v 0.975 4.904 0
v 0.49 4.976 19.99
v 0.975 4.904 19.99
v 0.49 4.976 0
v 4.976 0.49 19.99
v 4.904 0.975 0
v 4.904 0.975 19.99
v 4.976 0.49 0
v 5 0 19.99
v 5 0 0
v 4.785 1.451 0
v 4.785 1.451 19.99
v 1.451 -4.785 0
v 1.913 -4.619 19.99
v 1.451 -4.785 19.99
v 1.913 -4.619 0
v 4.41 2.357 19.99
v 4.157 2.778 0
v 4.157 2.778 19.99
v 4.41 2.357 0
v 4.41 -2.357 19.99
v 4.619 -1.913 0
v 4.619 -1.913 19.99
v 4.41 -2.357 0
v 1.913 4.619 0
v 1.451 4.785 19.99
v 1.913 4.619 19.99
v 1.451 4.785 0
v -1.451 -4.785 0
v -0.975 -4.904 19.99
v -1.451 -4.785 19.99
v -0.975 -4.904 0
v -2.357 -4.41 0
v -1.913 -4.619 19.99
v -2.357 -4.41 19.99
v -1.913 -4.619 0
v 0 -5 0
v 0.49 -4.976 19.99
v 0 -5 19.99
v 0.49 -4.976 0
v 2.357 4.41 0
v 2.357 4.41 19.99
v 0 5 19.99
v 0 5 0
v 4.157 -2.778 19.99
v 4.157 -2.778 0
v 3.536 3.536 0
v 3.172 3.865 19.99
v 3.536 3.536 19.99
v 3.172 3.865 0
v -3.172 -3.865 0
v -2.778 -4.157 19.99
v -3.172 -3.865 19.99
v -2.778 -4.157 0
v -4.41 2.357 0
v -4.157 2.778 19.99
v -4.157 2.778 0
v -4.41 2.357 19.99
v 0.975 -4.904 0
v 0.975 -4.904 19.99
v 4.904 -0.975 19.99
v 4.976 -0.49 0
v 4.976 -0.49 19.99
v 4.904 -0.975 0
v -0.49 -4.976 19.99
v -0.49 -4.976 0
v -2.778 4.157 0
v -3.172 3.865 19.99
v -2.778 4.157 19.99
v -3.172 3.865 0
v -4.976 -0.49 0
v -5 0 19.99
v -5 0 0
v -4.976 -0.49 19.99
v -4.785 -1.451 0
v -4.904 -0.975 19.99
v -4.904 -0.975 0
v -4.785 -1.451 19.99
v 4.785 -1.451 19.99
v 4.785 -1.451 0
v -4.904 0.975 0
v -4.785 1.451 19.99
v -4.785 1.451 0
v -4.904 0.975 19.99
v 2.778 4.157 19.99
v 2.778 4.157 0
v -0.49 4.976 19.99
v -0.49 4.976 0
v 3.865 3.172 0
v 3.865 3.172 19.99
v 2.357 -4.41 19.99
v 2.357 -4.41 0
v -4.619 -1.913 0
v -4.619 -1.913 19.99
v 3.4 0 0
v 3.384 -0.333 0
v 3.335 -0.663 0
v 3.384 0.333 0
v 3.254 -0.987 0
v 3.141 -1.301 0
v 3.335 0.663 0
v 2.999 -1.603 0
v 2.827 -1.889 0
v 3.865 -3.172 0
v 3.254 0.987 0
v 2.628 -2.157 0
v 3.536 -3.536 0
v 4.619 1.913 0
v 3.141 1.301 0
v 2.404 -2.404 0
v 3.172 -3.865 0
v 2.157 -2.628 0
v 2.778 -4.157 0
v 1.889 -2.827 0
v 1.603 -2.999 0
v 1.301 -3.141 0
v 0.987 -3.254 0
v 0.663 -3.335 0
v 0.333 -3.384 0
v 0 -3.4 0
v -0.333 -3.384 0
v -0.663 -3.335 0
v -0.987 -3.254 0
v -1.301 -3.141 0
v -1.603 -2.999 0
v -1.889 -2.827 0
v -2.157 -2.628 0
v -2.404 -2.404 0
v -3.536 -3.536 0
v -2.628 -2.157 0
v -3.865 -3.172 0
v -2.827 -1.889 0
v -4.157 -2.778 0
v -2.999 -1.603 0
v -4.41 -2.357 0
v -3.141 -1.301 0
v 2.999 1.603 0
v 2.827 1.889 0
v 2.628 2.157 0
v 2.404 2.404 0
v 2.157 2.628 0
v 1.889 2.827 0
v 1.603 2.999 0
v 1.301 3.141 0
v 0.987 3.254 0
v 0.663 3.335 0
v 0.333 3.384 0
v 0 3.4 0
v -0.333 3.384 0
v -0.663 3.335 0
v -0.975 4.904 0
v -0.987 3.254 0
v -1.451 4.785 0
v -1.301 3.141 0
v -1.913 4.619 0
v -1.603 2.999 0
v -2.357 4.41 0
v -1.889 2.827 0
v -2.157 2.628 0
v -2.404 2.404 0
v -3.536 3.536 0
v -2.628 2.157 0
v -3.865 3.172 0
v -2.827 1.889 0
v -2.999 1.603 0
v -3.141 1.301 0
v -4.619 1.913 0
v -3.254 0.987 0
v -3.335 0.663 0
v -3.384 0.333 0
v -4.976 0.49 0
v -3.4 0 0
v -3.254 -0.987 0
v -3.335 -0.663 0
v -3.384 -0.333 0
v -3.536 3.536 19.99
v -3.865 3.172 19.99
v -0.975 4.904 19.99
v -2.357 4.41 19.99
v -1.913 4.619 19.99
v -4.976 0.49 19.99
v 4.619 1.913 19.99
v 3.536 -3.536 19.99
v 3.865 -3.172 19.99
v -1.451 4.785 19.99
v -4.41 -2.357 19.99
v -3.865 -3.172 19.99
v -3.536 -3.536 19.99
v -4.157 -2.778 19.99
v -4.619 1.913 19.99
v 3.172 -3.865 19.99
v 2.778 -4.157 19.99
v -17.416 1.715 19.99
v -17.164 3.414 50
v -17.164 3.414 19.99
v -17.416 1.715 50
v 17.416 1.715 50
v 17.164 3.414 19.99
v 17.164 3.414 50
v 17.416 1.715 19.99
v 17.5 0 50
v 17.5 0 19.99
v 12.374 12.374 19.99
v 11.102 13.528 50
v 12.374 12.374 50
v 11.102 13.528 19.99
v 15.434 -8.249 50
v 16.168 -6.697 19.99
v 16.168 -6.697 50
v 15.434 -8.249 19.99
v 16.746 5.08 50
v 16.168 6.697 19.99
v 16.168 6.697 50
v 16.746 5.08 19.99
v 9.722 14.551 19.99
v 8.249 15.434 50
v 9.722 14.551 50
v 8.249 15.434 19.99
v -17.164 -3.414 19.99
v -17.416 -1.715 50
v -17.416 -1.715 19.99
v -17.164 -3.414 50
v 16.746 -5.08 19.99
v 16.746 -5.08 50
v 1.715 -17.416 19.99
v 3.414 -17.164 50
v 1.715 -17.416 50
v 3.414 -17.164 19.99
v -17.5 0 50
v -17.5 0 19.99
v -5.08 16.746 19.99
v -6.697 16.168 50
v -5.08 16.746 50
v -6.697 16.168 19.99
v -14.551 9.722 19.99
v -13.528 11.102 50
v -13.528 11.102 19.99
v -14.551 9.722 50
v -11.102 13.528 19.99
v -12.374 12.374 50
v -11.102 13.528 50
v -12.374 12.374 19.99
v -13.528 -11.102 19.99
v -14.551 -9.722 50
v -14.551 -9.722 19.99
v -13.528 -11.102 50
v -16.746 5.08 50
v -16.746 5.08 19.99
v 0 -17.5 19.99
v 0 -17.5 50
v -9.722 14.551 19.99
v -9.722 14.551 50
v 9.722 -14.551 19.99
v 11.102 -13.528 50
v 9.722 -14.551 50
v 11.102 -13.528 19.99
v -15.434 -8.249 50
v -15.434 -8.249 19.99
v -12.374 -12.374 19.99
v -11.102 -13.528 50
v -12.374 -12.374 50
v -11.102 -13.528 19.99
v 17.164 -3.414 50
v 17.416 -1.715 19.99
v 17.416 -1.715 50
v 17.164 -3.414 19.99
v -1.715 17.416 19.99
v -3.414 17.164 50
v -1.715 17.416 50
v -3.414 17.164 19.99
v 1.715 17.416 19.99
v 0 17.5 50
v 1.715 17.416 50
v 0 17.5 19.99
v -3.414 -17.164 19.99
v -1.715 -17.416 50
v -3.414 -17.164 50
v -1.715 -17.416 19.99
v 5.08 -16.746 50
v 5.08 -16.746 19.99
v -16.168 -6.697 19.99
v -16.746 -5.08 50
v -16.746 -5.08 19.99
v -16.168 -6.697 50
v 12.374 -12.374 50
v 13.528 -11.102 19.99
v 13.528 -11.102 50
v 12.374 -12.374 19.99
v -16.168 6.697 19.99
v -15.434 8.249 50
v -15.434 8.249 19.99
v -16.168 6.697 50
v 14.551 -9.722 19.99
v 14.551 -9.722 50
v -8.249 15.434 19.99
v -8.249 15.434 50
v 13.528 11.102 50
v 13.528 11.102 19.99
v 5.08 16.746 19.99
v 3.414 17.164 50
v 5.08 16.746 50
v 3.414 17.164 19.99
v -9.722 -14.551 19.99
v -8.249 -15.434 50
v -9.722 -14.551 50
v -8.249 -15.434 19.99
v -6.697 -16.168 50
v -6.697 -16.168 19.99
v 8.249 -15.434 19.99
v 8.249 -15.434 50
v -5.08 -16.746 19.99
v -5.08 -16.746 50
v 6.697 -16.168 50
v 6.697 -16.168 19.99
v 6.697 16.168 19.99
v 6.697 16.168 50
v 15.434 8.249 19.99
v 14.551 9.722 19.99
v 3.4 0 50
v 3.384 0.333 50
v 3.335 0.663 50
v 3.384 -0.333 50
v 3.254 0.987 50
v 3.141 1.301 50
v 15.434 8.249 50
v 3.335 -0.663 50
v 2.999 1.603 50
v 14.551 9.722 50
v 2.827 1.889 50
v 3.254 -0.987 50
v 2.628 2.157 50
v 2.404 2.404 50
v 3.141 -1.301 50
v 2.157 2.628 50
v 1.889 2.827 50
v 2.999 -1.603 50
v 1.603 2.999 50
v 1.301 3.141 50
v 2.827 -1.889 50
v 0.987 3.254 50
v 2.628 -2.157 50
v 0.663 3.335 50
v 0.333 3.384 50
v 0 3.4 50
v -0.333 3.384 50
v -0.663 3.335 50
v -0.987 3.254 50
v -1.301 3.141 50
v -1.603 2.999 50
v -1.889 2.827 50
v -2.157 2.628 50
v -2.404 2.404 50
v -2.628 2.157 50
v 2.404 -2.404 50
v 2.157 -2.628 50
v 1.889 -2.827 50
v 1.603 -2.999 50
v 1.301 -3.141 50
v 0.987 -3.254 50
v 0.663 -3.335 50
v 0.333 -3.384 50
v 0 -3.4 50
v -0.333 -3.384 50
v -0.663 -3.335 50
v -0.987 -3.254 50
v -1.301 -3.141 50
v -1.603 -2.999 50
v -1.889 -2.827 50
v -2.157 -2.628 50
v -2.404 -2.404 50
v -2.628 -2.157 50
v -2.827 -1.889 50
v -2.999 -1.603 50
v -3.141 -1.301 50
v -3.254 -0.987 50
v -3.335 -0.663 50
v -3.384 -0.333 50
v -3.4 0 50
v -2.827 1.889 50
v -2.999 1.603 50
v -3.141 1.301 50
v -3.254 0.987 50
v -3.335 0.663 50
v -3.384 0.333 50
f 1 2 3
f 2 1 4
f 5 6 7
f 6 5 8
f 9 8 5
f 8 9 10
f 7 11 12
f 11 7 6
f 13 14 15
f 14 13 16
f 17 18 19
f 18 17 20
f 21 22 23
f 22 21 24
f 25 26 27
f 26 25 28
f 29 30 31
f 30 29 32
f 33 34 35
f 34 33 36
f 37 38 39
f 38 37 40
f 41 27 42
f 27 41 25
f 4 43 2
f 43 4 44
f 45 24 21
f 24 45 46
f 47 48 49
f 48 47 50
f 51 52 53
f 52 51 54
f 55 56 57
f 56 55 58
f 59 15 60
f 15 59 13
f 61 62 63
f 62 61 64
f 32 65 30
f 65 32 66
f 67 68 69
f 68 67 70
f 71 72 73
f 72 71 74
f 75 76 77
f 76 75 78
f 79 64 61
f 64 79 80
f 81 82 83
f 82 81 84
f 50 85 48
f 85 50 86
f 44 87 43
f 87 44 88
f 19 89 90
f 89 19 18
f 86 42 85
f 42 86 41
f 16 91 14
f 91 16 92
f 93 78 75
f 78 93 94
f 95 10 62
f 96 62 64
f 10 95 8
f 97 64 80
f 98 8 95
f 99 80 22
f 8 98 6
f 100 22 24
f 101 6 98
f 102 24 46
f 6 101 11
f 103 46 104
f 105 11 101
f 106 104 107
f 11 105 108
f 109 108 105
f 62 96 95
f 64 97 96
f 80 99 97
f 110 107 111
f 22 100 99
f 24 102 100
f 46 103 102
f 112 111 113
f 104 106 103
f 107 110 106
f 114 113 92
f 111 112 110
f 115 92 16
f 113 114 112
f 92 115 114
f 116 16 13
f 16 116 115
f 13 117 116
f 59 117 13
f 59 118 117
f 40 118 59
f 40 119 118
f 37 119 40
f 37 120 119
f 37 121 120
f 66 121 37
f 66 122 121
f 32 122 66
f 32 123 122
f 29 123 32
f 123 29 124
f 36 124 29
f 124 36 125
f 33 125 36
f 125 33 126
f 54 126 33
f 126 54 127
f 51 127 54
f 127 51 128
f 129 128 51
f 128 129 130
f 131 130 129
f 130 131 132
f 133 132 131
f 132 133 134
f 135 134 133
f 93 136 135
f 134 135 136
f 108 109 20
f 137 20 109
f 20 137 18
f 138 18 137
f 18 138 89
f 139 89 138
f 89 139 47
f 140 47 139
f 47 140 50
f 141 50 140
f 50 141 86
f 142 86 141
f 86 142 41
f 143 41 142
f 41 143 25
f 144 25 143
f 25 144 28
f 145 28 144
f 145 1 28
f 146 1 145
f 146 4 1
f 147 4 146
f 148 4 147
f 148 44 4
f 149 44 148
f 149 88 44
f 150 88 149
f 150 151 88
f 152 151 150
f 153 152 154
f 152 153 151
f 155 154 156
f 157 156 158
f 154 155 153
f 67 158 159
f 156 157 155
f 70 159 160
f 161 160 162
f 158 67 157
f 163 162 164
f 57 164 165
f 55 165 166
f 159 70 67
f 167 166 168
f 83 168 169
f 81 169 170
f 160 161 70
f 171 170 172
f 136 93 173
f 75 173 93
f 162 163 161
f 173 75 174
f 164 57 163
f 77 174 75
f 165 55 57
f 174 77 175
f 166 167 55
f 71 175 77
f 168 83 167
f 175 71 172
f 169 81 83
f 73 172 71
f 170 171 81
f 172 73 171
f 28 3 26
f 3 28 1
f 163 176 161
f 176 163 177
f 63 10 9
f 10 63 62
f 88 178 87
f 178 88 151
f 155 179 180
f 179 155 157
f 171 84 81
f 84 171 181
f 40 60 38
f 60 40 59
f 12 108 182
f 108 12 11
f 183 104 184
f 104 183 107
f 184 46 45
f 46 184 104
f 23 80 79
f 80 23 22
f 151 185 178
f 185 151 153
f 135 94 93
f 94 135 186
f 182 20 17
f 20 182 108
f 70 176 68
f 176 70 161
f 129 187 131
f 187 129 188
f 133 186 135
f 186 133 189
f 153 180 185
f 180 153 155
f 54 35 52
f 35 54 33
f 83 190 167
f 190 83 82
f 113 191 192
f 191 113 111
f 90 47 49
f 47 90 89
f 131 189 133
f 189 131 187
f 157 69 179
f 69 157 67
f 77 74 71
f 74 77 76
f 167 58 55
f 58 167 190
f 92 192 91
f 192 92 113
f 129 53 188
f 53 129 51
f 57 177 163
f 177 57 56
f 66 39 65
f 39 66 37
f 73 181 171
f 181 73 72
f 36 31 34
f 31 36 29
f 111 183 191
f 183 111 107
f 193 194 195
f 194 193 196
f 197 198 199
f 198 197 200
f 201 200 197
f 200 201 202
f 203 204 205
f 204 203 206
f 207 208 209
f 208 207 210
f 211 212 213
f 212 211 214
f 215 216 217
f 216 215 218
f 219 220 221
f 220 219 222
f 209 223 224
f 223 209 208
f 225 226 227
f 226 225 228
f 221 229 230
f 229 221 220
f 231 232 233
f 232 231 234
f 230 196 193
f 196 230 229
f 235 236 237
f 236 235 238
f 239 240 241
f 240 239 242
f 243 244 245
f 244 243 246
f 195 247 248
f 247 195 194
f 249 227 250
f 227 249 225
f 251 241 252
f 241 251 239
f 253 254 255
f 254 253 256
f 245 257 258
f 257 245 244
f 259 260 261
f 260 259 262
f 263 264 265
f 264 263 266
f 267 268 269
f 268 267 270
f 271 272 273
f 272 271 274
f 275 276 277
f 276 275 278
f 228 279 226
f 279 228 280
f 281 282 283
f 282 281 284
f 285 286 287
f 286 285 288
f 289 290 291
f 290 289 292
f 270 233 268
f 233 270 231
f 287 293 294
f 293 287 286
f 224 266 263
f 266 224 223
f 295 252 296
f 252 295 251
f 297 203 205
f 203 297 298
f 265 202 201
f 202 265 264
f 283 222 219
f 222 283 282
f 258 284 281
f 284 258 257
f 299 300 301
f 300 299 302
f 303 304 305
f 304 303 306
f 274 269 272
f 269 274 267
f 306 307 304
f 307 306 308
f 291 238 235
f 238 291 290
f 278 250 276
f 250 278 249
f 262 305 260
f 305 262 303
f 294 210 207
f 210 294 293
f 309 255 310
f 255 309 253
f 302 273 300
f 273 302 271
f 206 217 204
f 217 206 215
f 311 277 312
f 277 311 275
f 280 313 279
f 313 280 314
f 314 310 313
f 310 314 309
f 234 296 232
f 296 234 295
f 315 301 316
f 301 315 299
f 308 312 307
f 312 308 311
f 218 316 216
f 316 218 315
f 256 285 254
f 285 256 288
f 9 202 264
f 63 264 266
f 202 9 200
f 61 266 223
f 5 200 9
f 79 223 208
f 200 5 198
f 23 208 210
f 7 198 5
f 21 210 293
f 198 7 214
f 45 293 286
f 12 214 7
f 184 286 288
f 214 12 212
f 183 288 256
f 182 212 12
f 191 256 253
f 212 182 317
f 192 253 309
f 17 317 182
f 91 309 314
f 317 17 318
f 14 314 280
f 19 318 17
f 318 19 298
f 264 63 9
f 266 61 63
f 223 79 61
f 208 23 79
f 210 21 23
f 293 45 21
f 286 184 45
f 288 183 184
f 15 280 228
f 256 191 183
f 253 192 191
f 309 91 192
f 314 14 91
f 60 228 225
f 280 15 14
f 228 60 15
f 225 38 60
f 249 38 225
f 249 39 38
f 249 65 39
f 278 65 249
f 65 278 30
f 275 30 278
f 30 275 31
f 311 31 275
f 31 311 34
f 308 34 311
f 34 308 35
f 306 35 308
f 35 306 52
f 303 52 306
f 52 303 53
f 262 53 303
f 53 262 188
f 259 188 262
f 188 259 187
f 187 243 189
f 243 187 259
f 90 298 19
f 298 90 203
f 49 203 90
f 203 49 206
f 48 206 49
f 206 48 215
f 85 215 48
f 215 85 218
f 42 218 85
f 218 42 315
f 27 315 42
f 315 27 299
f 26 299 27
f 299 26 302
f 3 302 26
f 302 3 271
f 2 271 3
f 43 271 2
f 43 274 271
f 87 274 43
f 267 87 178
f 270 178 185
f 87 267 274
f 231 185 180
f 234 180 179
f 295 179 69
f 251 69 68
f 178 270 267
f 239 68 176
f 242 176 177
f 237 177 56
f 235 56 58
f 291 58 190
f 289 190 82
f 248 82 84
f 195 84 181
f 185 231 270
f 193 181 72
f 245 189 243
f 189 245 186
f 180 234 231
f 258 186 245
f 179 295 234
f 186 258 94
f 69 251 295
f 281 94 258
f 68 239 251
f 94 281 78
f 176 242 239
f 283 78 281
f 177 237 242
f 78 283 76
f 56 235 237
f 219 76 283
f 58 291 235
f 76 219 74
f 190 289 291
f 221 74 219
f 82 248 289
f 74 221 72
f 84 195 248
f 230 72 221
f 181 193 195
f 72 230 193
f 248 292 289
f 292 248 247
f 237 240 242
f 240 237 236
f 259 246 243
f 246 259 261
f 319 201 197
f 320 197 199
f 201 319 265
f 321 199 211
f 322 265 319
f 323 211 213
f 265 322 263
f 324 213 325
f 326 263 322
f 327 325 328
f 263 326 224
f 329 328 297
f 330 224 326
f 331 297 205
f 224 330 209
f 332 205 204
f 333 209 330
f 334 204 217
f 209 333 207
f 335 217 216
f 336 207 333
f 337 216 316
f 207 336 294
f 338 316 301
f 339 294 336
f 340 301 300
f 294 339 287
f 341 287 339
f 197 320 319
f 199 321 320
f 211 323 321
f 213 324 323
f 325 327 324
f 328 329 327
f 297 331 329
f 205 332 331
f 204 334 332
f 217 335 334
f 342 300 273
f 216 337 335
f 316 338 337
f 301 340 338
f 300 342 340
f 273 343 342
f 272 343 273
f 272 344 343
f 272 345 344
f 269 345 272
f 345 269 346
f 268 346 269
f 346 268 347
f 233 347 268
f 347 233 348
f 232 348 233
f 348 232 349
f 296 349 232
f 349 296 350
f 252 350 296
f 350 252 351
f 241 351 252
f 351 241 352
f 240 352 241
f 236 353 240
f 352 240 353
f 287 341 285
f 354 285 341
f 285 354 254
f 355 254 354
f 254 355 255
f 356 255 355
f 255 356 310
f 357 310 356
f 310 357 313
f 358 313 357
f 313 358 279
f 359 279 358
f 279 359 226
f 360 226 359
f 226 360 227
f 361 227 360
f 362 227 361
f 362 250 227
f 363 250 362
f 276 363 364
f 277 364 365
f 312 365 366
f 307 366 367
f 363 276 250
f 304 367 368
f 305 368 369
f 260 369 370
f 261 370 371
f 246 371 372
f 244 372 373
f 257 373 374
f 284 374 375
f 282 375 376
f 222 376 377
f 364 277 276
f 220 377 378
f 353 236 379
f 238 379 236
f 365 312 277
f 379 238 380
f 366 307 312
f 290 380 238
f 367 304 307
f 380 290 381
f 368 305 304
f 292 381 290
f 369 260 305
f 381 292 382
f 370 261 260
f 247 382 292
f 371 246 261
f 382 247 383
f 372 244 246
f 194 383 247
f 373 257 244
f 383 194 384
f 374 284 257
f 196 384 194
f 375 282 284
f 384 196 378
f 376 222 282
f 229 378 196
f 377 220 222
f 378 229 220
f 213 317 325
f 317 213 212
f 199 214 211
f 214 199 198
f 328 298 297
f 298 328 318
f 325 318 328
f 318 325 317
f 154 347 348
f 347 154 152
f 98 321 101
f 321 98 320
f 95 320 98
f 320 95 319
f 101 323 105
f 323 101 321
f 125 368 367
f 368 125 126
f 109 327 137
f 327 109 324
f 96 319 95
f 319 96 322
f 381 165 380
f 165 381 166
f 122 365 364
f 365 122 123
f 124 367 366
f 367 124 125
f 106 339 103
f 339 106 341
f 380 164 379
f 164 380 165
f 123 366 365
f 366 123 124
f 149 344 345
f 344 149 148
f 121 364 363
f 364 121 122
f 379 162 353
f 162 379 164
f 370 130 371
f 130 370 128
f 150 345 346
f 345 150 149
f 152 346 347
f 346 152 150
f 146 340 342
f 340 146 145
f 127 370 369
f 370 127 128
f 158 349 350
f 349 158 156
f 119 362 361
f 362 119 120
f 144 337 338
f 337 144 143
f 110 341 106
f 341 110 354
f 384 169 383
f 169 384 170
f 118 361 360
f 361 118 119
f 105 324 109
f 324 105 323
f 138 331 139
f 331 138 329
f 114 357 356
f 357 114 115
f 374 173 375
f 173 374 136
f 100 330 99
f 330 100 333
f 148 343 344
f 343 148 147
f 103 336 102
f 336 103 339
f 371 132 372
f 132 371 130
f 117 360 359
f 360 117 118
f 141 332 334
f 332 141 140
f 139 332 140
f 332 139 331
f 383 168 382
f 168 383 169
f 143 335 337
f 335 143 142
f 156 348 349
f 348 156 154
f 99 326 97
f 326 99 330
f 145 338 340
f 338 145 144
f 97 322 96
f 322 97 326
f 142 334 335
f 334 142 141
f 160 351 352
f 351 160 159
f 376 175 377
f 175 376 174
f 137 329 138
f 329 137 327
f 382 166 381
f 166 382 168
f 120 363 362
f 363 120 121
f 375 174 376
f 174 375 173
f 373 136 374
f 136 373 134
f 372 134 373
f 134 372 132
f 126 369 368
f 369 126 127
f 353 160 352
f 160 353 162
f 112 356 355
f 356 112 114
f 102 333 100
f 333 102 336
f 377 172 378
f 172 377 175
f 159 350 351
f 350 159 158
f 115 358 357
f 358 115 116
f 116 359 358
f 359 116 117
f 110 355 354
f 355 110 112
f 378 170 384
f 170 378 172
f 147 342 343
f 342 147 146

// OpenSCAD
// Lab funnel - printed upright, wide opening at the top
// Units: mm

// ---- Parameters ----
spout_od      = 10;    // spout outer diameter
spout_h       = 20;    // spout height (z = 0 to 20)
cone_bottom_d = 10;    // cone outer diameter at z = 20
cone_top_d    = 60;    // cone outer diameter at rim (z = 50)
cone_top_z    = 50;    // rim height
wall          = 1.6;   // wall thickness everywhere
eps           = 0.5;   // cutter overshoot past faces

$fn = 64;              // curve resolution

// ---- Derived ----
spout_id = spout_od - 2 * wall;   // spout bore = 6.8 mm
cone_h   = cone_top_z - spout_h;  // cone height = 30 mm

// ---- Model ----
difference() {
    union() {
        // Straight spout
        cylinder(d = spout_od, h = spout_h);

        // Cone, slightly overlapping the spout for a clean union
        translate([0, 0, spout_h - 0.01])
            linear_extrude(height = cone_h + 0.01)
                circle(d = (cone_bottom_d + cone_top_d) / 2);
    }

    // Through-cut along the axis so liquid runs straight through
    translate([0, 0, -eps])
        cylinder(h = cone_top_z + 2 * eps, d = spout_id);
}
